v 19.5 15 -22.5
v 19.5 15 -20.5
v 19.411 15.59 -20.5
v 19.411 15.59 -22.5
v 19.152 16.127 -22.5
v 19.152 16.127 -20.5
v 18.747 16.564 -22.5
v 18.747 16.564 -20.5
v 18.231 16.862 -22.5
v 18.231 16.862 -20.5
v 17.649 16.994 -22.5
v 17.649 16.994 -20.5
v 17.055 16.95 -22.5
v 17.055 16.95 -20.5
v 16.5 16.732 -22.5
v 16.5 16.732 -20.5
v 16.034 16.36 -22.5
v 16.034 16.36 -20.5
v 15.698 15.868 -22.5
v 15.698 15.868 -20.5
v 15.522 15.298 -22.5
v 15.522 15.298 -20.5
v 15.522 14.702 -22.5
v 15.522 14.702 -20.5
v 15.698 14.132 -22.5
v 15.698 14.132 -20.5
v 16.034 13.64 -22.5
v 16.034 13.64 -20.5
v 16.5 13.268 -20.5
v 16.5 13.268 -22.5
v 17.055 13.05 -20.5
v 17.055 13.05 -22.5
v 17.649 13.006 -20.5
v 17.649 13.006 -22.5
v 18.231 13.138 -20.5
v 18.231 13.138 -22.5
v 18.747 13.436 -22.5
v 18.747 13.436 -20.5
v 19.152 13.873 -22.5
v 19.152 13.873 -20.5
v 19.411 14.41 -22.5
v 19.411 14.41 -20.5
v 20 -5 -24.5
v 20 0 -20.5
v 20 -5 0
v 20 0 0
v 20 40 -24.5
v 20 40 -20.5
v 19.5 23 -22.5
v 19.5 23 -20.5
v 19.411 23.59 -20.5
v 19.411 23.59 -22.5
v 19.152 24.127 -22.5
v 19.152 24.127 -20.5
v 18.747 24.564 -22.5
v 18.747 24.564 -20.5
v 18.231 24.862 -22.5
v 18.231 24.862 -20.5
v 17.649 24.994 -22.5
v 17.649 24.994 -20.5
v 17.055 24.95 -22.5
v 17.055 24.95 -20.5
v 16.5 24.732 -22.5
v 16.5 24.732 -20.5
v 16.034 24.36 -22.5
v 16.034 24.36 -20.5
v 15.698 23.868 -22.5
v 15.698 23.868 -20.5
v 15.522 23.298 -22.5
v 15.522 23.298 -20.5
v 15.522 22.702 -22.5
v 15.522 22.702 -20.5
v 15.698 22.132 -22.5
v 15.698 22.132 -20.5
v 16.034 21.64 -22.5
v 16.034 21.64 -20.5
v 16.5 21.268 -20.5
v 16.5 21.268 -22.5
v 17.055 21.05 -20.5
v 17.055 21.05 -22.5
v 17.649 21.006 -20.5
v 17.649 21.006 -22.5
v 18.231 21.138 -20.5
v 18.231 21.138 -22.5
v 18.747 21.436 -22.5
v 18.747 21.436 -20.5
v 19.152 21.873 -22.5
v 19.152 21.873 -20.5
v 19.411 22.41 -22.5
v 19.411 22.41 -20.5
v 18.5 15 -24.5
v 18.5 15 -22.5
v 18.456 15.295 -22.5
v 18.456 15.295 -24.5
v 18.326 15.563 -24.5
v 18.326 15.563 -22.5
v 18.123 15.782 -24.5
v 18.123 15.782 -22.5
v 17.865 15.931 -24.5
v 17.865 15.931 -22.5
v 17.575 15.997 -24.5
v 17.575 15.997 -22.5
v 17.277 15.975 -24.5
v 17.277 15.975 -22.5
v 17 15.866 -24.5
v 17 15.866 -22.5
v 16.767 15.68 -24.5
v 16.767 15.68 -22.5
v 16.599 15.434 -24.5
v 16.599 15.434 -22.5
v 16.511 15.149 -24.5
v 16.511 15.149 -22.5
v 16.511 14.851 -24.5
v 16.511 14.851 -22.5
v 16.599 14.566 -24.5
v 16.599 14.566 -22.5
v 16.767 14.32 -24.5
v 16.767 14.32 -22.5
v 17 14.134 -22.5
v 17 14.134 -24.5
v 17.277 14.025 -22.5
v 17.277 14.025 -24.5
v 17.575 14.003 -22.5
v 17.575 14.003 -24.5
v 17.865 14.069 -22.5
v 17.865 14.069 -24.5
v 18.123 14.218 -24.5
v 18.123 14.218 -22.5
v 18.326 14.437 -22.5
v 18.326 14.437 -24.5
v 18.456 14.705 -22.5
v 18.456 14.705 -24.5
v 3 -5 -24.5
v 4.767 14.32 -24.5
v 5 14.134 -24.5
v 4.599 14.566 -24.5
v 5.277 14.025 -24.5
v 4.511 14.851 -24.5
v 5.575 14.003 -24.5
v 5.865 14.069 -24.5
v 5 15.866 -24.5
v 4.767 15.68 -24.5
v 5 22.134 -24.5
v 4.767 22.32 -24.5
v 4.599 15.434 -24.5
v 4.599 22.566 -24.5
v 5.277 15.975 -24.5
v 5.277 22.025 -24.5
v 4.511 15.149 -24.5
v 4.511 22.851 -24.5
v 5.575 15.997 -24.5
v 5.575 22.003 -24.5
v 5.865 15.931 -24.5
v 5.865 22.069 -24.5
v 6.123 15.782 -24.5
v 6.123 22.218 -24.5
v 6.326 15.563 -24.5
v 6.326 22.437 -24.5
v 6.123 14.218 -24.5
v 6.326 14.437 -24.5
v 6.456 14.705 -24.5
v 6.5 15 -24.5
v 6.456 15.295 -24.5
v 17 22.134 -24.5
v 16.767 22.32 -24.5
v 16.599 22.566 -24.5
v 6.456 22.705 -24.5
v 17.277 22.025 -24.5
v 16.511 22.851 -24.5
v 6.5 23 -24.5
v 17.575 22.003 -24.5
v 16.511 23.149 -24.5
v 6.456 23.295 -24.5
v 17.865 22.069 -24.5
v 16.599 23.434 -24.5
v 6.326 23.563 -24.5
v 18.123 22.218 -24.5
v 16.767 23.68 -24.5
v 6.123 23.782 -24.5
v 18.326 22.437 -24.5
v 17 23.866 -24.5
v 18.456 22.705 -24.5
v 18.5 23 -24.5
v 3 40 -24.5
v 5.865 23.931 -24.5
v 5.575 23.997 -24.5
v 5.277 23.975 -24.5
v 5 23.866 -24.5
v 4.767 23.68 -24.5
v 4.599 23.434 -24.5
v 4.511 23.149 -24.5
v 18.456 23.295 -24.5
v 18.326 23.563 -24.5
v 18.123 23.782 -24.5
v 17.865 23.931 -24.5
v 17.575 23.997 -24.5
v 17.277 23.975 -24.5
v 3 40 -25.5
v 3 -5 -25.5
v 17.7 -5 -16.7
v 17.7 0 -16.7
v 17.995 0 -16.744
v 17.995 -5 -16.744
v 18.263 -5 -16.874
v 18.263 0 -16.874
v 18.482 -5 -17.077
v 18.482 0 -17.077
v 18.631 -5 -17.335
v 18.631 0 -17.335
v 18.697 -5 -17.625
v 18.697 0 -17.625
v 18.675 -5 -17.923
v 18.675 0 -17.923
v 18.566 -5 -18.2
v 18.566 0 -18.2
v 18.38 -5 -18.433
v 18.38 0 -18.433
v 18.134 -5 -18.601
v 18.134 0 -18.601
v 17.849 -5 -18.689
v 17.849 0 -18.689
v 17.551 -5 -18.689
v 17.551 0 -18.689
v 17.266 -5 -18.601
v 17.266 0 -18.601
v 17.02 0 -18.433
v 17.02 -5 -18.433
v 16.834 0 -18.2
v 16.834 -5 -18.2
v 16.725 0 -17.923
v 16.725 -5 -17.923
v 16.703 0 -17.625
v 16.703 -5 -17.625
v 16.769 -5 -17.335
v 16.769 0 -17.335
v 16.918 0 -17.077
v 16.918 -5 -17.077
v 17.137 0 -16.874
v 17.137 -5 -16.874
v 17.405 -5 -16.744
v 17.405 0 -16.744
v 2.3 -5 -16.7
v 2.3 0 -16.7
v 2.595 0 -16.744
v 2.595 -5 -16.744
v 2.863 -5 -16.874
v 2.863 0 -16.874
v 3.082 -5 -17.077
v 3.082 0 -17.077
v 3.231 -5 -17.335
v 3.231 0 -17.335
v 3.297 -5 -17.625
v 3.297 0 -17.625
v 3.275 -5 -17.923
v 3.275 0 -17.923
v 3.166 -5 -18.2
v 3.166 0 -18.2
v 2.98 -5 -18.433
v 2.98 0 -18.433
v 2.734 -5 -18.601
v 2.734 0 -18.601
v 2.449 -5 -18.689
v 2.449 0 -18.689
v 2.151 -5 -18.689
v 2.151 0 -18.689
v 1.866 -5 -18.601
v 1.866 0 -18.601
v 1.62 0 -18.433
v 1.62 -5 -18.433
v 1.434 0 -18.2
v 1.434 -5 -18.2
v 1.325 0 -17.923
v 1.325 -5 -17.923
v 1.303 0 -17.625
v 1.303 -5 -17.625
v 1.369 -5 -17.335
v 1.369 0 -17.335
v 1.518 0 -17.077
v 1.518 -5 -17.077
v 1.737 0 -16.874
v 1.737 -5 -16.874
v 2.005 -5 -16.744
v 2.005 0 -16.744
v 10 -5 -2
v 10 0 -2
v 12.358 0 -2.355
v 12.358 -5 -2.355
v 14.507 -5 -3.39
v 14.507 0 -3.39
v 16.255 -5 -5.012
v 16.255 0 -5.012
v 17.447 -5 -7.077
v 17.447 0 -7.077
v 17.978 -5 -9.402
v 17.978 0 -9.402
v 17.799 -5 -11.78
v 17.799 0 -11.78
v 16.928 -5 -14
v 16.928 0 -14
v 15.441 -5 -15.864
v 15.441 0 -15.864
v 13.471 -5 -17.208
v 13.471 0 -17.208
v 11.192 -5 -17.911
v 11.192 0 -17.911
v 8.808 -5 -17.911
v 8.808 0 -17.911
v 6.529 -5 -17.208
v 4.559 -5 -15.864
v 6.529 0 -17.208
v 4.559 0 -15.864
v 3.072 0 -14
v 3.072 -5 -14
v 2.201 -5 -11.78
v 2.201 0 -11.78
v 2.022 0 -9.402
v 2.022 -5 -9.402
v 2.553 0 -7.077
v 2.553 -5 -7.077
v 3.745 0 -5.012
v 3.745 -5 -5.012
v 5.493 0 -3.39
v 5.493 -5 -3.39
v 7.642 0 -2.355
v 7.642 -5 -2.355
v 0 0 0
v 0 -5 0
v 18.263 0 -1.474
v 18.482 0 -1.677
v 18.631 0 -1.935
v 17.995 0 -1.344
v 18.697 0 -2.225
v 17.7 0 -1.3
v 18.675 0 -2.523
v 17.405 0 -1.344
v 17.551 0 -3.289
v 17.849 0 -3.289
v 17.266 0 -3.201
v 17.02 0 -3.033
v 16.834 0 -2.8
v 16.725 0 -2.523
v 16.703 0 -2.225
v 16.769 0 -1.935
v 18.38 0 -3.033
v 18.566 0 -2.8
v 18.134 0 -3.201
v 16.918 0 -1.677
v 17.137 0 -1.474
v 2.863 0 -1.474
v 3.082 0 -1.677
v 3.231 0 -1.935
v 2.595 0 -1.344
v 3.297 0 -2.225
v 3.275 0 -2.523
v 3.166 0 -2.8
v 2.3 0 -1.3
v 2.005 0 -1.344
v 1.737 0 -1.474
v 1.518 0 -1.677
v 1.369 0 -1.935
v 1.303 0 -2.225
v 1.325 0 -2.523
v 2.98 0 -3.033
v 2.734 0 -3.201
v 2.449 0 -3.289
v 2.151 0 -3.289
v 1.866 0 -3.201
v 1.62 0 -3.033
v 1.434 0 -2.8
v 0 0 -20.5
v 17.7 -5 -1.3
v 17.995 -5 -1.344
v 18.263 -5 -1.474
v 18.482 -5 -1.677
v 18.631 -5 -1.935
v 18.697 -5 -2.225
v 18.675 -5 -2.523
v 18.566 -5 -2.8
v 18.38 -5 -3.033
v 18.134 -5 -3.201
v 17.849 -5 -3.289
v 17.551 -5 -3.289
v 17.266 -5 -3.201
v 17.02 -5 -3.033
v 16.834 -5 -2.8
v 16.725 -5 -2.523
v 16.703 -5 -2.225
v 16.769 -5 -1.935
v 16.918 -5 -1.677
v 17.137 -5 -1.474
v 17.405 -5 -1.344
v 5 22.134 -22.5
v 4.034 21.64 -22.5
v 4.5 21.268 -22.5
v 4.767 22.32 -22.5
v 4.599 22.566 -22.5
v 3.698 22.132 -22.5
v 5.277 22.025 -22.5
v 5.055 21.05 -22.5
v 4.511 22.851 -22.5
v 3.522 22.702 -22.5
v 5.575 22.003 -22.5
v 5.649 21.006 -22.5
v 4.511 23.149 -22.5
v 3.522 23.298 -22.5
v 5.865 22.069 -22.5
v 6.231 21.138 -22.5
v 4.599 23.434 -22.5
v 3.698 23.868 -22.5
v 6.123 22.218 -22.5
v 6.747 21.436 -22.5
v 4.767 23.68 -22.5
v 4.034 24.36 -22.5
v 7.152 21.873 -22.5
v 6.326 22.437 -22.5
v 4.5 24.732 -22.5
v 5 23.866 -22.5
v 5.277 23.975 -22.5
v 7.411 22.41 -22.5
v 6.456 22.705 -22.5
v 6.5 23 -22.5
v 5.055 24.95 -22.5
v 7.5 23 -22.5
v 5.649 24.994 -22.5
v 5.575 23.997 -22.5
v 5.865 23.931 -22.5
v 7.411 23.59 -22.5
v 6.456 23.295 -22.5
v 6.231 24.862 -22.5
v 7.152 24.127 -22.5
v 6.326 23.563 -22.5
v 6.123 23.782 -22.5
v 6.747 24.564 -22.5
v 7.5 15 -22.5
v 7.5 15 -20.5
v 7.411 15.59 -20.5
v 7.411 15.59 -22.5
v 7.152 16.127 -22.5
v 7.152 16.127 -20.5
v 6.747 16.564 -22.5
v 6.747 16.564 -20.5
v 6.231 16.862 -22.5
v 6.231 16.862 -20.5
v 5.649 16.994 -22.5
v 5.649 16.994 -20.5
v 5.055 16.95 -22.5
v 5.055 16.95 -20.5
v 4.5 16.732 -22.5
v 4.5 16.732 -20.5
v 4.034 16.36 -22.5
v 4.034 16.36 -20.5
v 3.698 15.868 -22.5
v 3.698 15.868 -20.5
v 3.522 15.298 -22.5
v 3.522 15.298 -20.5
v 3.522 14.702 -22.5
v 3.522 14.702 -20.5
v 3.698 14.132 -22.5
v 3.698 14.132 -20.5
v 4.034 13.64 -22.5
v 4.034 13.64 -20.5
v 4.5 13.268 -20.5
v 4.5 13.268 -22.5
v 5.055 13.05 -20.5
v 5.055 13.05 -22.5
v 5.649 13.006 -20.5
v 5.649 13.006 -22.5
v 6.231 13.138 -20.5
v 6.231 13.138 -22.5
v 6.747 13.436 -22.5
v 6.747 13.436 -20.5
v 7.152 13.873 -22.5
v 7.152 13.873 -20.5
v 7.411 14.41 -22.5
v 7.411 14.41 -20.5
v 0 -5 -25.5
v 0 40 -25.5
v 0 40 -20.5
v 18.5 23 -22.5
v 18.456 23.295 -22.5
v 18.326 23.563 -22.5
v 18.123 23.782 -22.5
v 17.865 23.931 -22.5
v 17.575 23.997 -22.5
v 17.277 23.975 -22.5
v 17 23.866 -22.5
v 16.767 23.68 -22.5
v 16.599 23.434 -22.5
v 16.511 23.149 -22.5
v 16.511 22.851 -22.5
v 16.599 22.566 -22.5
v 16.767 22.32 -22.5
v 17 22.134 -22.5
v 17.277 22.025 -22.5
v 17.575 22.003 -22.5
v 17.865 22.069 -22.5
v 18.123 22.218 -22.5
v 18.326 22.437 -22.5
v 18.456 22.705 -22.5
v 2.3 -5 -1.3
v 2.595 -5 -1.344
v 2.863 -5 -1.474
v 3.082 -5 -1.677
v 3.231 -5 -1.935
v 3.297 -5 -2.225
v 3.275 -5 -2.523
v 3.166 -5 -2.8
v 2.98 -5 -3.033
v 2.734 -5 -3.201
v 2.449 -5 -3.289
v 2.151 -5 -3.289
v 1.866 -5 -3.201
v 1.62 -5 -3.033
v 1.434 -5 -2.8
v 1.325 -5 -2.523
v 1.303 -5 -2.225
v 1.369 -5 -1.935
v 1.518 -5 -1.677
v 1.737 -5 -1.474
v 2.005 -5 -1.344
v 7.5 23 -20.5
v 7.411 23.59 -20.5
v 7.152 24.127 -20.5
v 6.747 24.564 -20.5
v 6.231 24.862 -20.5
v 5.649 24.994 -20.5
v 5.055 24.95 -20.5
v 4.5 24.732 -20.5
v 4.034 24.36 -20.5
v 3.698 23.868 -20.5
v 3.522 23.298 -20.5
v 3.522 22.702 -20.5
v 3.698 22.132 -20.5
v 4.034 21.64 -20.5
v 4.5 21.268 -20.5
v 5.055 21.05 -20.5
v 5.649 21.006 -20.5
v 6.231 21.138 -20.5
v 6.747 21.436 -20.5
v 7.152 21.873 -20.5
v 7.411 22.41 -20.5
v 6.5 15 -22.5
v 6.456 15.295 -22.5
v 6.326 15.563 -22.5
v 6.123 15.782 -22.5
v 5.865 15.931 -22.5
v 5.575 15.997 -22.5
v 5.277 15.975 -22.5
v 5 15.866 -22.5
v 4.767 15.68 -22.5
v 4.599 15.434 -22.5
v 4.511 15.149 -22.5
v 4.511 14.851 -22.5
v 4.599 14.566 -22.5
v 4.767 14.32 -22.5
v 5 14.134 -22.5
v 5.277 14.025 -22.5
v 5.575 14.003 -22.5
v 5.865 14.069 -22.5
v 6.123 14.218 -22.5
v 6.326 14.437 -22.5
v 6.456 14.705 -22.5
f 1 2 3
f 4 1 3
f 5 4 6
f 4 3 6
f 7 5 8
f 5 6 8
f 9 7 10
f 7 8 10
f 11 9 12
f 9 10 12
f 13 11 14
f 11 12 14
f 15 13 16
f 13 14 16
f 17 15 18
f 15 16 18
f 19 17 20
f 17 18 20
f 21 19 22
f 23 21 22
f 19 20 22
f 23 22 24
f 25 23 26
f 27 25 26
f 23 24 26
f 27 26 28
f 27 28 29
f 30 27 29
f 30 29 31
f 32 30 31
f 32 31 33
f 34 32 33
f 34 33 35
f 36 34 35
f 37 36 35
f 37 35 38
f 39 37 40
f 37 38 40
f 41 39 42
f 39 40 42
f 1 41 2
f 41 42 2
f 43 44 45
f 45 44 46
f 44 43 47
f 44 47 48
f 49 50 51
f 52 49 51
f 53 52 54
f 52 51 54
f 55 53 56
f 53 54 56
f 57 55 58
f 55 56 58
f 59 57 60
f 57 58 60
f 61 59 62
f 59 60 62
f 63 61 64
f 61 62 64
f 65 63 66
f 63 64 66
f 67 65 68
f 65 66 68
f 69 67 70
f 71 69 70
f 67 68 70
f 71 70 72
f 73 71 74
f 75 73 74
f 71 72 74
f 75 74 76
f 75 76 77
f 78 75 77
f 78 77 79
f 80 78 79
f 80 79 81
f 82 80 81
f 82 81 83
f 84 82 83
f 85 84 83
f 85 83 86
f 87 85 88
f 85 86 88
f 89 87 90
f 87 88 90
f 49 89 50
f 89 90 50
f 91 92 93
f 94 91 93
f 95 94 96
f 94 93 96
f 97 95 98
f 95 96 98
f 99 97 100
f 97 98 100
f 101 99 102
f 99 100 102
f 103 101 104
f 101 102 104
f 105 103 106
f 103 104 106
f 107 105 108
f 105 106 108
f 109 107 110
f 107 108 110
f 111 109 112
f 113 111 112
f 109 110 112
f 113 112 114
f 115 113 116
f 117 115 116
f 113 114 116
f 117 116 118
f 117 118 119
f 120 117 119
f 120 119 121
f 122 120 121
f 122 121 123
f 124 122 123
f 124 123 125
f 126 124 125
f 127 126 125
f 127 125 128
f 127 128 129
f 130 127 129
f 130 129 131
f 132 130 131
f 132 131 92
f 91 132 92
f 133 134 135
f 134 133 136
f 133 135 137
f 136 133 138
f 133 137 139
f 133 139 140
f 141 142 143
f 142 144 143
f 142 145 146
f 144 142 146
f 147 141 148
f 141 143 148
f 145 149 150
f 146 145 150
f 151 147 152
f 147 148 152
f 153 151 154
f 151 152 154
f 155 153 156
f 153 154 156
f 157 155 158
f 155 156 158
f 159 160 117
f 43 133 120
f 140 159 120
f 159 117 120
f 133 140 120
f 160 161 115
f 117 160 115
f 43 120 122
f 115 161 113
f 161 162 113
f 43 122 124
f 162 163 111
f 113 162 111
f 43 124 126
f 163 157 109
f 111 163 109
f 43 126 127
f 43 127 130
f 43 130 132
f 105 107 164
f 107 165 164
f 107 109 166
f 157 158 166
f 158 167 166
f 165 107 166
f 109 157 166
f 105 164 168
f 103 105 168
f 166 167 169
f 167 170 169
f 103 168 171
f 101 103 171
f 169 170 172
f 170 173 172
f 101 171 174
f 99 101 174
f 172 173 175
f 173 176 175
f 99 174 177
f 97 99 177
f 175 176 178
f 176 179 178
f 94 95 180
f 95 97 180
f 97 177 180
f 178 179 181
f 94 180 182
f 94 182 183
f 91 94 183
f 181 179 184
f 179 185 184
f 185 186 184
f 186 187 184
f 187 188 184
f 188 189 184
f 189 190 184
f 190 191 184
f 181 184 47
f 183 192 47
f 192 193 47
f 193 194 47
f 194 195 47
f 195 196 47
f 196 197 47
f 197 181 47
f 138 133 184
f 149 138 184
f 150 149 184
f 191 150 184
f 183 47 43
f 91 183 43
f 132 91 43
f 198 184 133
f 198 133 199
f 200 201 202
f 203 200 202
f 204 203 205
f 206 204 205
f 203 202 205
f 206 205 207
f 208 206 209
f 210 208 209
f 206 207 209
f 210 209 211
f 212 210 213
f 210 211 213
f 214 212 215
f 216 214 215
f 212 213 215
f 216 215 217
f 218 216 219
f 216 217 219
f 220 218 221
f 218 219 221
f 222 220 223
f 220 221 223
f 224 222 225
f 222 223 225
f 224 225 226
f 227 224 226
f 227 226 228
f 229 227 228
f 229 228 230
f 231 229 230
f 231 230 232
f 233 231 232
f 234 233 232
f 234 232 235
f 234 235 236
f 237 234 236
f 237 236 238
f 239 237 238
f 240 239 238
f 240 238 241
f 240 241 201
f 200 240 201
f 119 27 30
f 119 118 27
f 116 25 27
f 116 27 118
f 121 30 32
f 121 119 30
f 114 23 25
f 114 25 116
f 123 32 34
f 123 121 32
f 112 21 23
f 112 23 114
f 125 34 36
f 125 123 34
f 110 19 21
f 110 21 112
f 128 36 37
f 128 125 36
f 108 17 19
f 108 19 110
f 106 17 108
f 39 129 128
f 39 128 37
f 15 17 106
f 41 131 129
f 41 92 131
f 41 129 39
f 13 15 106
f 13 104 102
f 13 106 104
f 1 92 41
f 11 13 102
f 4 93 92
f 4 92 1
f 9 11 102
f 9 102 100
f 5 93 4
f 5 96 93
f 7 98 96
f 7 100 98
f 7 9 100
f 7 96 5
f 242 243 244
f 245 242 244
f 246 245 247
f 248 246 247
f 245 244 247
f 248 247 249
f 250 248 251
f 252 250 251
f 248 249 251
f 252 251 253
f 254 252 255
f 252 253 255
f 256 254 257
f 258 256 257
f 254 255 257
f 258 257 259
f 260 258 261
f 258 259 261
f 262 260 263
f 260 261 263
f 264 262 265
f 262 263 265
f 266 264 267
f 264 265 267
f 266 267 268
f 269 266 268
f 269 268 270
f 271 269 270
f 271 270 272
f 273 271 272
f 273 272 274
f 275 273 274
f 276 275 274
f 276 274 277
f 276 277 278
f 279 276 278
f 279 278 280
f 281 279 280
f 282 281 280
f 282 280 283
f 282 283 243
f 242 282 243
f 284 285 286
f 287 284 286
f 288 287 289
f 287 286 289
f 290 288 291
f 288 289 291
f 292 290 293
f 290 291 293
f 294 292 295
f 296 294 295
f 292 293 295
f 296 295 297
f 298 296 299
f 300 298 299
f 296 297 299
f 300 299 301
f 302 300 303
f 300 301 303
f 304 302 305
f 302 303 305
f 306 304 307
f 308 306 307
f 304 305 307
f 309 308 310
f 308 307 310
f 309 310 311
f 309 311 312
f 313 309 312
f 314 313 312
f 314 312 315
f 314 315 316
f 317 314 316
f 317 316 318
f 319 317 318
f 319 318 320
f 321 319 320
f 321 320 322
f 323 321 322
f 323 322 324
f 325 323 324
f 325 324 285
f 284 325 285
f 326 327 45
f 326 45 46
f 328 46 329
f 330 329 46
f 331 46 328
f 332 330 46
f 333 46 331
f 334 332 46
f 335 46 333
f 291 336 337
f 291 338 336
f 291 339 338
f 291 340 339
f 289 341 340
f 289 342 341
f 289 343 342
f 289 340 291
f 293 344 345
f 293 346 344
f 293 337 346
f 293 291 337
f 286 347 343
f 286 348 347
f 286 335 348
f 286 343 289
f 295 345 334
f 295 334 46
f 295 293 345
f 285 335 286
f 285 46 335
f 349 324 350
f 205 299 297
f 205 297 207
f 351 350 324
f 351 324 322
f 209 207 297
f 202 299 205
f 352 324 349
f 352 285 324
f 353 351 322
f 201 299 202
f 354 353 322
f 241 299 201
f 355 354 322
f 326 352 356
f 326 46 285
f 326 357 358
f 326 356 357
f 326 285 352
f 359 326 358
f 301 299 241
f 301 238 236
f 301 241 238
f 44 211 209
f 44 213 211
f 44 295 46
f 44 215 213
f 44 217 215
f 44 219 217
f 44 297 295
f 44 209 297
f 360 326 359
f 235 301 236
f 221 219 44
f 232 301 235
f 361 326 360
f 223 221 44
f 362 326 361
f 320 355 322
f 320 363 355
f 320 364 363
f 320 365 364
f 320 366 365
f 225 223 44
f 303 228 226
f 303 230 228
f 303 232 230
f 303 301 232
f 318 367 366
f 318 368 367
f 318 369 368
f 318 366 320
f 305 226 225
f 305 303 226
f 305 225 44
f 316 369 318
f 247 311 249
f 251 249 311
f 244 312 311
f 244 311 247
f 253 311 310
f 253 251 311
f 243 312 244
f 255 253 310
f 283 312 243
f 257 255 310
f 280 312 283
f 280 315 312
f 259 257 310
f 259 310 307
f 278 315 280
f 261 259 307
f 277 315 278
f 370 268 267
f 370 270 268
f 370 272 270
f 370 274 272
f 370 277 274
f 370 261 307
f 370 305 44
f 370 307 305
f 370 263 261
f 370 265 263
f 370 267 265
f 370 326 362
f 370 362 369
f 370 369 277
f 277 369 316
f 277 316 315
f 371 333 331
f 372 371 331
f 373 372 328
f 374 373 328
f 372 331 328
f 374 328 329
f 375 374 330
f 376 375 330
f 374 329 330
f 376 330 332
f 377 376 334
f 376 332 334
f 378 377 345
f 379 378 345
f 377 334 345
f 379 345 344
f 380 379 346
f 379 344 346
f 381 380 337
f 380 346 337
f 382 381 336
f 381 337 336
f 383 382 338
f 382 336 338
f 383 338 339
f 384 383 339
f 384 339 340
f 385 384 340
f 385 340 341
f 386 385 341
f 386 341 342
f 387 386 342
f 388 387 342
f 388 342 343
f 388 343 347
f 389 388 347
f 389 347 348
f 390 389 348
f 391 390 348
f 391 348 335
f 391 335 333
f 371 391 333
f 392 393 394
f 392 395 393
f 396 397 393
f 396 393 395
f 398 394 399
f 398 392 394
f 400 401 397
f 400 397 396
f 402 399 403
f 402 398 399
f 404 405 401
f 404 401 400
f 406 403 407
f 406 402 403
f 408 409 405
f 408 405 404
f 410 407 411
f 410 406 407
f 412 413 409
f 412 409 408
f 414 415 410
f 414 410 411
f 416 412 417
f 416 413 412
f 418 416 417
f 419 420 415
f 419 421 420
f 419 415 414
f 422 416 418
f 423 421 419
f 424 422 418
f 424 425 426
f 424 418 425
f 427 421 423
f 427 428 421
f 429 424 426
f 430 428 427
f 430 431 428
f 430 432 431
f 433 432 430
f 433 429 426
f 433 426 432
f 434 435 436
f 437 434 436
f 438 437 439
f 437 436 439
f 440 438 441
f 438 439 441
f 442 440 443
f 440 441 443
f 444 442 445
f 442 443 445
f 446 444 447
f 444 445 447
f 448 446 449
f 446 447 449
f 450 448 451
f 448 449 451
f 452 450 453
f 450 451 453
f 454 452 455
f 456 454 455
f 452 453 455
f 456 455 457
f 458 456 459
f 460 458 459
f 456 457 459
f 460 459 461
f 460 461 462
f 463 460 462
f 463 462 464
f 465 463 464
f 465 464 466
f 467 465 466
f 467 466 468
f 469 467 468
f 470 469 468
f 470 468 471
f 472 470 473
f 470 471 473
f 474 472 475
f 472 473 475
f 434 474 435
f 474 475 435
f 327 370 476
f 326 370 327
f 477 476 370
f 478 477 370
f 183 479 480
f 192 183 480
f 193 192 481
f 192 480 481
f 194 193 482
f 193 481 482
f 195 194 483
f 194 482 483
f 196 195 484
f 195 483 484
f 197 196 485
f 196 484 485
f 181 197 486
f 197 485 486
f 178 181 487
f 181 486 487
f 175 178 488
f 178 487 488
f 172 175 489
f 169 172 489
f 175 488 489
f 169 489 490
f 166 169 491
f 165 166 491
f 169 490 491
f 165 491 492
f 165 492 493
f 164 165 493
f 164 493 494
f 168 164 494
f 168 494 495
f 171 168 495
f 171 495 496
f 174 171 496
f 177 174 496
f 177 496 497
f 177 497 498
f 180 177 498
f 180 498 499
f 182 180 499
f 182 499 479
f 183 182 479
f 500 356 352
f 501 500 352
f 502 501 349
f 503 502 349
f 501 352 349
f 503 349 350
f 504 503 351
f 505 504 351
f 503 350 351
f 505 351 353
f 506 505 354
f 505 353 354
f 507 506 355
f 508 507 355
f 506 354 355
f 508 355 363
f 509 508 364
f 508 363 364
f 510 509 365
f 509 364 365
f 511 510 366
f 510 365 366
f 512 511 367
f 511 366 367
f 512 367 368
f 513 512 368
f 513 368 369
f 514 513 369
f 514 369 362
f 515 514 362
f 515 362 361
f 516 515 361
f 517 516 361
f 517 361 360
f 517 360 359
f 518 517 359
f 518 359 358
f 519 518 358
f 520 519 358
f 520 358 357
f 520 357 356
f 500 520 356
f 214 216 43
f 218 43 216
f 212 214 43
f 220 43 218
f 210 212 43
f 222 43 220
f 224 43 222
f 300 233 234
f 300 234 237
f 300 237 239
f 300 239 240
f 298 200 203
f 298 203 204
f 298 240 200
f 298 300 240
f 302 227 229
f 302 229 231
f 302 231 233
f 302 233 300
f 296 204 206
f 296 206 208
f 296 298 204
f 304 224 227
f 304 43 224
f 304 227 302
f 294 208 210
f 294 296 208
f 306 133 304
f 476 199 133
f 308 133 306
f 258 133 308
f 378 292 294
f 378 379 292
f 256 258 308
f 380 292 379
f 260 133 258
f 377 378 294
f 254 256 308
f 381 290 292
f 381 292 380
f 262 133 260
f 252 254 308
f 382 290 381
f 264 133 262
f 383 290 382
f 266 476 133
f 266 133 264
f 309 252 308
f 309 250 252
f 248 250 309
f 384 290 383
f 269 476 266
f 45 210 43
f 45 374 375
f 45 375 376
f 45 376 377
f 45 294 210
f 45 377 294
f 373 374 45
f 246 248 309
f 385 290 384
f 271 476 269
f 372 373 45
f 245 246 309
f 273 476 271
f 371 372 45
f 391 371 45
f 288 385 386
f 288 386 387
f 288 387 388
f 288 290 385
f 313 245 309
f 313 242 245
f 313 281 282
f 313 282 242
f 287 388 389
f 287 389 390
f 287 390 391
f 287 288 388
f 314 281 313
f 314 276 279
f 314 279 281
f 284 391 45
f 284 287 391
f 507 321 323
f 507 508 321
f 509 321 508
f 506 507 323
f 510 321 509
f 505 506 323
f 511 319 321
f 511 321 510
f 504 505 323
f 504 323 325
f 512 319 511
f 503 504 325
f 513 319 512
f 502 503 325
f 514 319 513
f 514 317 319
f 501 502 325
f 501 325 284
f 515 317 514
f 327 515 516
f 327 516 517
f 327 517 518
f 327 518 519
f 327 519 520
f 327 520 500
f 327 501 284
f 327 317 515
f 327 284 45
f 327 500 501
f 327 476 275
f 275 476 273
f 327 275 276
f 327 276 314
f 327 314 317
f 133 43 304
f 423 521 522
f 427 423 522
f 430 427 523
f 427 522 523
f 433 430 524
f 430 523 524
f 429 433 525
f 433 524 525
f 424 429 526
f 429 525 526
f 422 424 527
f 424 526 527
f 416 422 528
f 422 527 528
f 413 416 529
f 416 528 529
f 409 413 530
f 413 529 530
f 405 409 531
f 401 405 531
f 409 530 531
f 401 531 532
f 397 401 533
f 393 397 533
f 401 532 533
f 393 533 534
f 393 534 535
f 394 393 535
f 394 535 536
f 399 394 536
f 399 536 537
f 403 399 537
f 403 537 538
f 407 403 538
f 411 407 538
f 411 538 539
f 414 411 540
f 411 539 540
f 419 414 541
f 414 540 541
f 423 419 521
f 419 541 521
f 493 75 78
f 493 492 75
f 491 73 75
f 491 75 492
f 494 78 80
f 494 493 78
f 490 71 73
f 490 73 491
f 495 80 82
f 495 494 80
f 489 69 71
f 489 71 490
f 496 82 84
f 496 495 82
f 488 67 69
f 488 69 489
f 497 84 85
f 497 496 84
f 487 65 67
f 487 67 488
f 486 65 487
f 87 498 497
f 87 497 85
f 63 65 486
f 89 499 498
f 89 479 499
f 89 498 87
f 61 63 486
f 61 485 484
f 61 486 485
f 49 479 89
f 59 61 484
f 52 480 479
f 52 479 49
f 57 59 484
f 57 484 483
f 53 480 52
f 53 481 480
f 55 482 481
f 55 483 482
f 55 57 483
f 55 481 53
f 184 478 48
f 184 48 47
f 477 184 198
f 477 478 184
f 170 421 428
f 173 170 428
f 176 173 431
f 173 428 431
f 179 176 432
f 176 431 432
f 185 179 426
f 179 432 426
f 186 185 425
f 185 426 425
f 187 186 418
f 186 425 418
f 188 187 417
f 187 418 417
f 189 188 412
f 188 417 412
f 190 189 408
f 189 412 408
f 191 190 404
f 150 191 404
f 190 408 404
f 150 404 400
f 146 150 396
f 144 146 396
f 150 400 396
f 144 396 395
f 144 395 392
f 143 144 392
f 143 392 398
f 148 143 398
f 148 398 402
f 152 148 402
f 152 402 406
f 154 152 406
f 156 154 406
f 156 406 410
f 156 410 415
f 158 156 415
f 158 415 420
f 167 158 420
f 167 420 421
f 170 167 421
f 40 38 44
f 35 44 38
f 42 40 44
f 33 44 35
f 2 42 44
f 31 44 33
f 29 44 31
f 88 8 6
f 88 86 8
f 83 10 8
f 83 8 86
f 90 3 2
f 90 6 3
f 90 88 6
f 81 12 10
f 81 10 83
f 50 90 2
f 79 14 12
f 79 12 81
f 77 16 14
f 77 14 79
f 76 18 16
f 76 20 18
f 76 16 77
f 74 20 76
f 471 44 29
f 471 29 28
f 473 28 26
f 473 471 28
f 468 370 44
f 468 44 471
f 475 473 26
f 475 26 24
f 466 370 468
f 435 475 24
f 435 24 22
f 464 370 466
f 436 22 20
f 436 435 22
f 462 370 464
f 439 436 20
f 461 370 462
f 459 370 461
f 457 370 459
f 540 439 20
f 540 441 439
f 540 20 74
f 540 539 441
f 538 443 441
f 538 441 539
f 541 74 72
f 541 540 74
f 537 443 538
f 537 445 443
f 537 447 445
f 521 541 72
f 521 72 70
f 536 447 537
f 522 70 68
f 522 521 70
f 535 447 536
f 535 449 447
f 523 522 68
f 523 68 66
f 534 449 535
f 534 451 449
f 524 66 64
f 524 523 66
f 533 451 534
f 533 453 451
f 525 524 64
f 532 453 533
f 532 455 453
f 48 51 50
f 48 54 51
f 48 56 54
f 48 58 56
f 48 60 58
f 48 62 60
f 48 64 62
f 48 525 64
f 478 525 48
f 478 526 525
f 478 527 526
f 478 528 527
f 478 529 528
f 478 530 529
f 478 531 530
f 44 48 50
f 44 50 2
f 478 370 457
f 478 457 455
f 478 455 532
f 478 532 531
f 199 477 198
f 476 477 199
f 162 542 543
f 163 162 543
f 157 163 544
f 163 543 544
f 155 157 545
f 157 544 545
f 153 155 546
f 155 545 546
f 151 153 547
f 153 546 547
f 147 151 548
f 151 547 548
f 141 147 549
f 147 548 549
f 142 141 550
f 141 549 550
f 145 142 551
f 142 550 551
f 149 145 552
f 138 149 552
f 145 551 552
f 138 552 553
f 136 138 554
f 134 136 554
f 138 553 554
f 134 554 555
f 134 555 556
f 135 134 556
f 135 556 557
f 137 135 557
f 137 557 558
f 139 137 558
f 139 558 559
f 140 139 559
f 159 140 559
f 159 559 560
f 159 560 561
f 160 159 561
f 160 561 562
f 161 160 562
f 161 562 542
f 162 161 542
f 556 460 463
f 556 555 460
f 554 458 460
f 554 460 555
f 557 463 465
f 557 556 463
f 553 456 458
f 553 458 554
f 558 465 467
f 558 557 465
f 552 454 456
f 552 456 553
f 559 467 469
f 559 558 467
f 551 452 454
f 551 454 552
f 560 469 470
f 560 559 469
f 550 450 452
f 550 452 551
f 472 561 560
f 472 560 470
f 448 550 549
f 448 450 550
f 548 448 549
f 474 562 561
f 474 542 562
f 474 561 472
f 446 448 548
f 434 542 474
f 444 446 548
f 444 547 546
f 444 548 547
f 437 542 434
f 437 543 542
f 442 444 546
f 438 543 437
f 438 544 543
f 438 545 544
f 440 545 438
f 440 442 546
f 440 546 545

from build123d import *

# Parameters (mm, degrees)
BOSS_EXTRUDE1_DEPTH = 20
SKETCH3_R           = 8
SKETCH3_R_2         = 1
CUT_EXTRUDE1_DEPTH  = 10
SKETCH4_R           = 1
CUT_EXTRUDE2_DEPTH  = 10
SKETCH5_R           = 2
CUT_EXTRUDE3_DEPTH  = 2
SKETCH6_W           = 17
SKETCH6_H           = 1
CUT_EXTRUDE4_DEPTH  = 65


with BuildPart() as part:
    # Sketch1 → Boss-Extrude1 (new body)
    with BuildSketch(Plane(origin=(0, 0, 0), x_dir=(0, 0, -1), z_dir=(1, 0, 0))):
        Polygon((0, 0), (20.5, 0), (20.5, 40), (25.5, 40), (25.5, -5), (0, -5), align=None)
    extrude(amount=BOSS_EXTRUDE1_DEPTH)

    # Sketch3 → Cut-Extrude1 (cut)
    with BuildSketch(Plane(origin=(0, 0, 0), x_dir=(1, 0, 0), z_dir=(0, 1, 0))):
        with Locations(Location((10, 10, 0), (0, 0, 270))):
            Circle(SKETCH3_R)
        with Locations(Location((2.3, 17.7, 0), (0, 0, 270))):
            Circle(SKETCH3_R_2)
        with Locations(Location((17.7, 17.7, 0), (0, 0, 270))):
            Circle(SKETCH3_R_2)
        with Locations(Location((17.7, 2.3, 0), (0, 0, 270))):
            Circle(SKETCH3_R_2)
        with Locations(Location((2.3, 2.3, 0), (0, 0, 270))):
            Circle(SKETCH3_R_2)
    extrude(amount=-CUT_EXTRUDE1_DEPTH, mode=Mode.SUBTRACT)

    # Sketch4 → Cut-Extrude2 (cut)
    with BuildSketch(Plane.XY.offset(-20.5)):
        with Locations((5.5, 15)):
            Circle(SKETCH4_R)
        with Locations((5.5, 23)):
            Circle(SKETCH4_R)
        with Locations((17.5, 23)):
            Circle(SKETCH4_R)
        with Locations((17.5, 15)):
            Circle(SKETCH4_R)
    extrude(amount=-CUT_EXTRUDE2_DEPTH, mode=Mode.SUBTRACT)

    # Sketch5 → Cut-Extrude3 (cut)
    with BuildSketch(Plane.XY.offset(-20.5)):
        with Locations((5.5, 23)):
            Circle(SKETCH5_R)
        with Locations((5.5, 15)):
            Circle(SKETCH5_R)
        with Locations((17.5, 15)):
            Circle(SKETCH5_R)
        with Locations((17.5, 23)):
            Circle(SKETCH5_R)
    extrude(amount=-CUT_EXTRUDE3_DEPTH, mode=Mode.SUBTRACT)

    # Sketch6 → Cut-Extrude4 (cut)
    with BuildSketch(Plane(origin=(0, 40, 0), x_dir=(1, 0, 0), z_dir=(0, 1, 0))):
        with Locations((11.5, 25)):
            Rectangle(SKETCH6_W, SKETCH6_H)
    extrude(amount=-CUT_EXTRUDE4_DEPTH, mode=Mode.SUBTRACT)


solid = part.part
